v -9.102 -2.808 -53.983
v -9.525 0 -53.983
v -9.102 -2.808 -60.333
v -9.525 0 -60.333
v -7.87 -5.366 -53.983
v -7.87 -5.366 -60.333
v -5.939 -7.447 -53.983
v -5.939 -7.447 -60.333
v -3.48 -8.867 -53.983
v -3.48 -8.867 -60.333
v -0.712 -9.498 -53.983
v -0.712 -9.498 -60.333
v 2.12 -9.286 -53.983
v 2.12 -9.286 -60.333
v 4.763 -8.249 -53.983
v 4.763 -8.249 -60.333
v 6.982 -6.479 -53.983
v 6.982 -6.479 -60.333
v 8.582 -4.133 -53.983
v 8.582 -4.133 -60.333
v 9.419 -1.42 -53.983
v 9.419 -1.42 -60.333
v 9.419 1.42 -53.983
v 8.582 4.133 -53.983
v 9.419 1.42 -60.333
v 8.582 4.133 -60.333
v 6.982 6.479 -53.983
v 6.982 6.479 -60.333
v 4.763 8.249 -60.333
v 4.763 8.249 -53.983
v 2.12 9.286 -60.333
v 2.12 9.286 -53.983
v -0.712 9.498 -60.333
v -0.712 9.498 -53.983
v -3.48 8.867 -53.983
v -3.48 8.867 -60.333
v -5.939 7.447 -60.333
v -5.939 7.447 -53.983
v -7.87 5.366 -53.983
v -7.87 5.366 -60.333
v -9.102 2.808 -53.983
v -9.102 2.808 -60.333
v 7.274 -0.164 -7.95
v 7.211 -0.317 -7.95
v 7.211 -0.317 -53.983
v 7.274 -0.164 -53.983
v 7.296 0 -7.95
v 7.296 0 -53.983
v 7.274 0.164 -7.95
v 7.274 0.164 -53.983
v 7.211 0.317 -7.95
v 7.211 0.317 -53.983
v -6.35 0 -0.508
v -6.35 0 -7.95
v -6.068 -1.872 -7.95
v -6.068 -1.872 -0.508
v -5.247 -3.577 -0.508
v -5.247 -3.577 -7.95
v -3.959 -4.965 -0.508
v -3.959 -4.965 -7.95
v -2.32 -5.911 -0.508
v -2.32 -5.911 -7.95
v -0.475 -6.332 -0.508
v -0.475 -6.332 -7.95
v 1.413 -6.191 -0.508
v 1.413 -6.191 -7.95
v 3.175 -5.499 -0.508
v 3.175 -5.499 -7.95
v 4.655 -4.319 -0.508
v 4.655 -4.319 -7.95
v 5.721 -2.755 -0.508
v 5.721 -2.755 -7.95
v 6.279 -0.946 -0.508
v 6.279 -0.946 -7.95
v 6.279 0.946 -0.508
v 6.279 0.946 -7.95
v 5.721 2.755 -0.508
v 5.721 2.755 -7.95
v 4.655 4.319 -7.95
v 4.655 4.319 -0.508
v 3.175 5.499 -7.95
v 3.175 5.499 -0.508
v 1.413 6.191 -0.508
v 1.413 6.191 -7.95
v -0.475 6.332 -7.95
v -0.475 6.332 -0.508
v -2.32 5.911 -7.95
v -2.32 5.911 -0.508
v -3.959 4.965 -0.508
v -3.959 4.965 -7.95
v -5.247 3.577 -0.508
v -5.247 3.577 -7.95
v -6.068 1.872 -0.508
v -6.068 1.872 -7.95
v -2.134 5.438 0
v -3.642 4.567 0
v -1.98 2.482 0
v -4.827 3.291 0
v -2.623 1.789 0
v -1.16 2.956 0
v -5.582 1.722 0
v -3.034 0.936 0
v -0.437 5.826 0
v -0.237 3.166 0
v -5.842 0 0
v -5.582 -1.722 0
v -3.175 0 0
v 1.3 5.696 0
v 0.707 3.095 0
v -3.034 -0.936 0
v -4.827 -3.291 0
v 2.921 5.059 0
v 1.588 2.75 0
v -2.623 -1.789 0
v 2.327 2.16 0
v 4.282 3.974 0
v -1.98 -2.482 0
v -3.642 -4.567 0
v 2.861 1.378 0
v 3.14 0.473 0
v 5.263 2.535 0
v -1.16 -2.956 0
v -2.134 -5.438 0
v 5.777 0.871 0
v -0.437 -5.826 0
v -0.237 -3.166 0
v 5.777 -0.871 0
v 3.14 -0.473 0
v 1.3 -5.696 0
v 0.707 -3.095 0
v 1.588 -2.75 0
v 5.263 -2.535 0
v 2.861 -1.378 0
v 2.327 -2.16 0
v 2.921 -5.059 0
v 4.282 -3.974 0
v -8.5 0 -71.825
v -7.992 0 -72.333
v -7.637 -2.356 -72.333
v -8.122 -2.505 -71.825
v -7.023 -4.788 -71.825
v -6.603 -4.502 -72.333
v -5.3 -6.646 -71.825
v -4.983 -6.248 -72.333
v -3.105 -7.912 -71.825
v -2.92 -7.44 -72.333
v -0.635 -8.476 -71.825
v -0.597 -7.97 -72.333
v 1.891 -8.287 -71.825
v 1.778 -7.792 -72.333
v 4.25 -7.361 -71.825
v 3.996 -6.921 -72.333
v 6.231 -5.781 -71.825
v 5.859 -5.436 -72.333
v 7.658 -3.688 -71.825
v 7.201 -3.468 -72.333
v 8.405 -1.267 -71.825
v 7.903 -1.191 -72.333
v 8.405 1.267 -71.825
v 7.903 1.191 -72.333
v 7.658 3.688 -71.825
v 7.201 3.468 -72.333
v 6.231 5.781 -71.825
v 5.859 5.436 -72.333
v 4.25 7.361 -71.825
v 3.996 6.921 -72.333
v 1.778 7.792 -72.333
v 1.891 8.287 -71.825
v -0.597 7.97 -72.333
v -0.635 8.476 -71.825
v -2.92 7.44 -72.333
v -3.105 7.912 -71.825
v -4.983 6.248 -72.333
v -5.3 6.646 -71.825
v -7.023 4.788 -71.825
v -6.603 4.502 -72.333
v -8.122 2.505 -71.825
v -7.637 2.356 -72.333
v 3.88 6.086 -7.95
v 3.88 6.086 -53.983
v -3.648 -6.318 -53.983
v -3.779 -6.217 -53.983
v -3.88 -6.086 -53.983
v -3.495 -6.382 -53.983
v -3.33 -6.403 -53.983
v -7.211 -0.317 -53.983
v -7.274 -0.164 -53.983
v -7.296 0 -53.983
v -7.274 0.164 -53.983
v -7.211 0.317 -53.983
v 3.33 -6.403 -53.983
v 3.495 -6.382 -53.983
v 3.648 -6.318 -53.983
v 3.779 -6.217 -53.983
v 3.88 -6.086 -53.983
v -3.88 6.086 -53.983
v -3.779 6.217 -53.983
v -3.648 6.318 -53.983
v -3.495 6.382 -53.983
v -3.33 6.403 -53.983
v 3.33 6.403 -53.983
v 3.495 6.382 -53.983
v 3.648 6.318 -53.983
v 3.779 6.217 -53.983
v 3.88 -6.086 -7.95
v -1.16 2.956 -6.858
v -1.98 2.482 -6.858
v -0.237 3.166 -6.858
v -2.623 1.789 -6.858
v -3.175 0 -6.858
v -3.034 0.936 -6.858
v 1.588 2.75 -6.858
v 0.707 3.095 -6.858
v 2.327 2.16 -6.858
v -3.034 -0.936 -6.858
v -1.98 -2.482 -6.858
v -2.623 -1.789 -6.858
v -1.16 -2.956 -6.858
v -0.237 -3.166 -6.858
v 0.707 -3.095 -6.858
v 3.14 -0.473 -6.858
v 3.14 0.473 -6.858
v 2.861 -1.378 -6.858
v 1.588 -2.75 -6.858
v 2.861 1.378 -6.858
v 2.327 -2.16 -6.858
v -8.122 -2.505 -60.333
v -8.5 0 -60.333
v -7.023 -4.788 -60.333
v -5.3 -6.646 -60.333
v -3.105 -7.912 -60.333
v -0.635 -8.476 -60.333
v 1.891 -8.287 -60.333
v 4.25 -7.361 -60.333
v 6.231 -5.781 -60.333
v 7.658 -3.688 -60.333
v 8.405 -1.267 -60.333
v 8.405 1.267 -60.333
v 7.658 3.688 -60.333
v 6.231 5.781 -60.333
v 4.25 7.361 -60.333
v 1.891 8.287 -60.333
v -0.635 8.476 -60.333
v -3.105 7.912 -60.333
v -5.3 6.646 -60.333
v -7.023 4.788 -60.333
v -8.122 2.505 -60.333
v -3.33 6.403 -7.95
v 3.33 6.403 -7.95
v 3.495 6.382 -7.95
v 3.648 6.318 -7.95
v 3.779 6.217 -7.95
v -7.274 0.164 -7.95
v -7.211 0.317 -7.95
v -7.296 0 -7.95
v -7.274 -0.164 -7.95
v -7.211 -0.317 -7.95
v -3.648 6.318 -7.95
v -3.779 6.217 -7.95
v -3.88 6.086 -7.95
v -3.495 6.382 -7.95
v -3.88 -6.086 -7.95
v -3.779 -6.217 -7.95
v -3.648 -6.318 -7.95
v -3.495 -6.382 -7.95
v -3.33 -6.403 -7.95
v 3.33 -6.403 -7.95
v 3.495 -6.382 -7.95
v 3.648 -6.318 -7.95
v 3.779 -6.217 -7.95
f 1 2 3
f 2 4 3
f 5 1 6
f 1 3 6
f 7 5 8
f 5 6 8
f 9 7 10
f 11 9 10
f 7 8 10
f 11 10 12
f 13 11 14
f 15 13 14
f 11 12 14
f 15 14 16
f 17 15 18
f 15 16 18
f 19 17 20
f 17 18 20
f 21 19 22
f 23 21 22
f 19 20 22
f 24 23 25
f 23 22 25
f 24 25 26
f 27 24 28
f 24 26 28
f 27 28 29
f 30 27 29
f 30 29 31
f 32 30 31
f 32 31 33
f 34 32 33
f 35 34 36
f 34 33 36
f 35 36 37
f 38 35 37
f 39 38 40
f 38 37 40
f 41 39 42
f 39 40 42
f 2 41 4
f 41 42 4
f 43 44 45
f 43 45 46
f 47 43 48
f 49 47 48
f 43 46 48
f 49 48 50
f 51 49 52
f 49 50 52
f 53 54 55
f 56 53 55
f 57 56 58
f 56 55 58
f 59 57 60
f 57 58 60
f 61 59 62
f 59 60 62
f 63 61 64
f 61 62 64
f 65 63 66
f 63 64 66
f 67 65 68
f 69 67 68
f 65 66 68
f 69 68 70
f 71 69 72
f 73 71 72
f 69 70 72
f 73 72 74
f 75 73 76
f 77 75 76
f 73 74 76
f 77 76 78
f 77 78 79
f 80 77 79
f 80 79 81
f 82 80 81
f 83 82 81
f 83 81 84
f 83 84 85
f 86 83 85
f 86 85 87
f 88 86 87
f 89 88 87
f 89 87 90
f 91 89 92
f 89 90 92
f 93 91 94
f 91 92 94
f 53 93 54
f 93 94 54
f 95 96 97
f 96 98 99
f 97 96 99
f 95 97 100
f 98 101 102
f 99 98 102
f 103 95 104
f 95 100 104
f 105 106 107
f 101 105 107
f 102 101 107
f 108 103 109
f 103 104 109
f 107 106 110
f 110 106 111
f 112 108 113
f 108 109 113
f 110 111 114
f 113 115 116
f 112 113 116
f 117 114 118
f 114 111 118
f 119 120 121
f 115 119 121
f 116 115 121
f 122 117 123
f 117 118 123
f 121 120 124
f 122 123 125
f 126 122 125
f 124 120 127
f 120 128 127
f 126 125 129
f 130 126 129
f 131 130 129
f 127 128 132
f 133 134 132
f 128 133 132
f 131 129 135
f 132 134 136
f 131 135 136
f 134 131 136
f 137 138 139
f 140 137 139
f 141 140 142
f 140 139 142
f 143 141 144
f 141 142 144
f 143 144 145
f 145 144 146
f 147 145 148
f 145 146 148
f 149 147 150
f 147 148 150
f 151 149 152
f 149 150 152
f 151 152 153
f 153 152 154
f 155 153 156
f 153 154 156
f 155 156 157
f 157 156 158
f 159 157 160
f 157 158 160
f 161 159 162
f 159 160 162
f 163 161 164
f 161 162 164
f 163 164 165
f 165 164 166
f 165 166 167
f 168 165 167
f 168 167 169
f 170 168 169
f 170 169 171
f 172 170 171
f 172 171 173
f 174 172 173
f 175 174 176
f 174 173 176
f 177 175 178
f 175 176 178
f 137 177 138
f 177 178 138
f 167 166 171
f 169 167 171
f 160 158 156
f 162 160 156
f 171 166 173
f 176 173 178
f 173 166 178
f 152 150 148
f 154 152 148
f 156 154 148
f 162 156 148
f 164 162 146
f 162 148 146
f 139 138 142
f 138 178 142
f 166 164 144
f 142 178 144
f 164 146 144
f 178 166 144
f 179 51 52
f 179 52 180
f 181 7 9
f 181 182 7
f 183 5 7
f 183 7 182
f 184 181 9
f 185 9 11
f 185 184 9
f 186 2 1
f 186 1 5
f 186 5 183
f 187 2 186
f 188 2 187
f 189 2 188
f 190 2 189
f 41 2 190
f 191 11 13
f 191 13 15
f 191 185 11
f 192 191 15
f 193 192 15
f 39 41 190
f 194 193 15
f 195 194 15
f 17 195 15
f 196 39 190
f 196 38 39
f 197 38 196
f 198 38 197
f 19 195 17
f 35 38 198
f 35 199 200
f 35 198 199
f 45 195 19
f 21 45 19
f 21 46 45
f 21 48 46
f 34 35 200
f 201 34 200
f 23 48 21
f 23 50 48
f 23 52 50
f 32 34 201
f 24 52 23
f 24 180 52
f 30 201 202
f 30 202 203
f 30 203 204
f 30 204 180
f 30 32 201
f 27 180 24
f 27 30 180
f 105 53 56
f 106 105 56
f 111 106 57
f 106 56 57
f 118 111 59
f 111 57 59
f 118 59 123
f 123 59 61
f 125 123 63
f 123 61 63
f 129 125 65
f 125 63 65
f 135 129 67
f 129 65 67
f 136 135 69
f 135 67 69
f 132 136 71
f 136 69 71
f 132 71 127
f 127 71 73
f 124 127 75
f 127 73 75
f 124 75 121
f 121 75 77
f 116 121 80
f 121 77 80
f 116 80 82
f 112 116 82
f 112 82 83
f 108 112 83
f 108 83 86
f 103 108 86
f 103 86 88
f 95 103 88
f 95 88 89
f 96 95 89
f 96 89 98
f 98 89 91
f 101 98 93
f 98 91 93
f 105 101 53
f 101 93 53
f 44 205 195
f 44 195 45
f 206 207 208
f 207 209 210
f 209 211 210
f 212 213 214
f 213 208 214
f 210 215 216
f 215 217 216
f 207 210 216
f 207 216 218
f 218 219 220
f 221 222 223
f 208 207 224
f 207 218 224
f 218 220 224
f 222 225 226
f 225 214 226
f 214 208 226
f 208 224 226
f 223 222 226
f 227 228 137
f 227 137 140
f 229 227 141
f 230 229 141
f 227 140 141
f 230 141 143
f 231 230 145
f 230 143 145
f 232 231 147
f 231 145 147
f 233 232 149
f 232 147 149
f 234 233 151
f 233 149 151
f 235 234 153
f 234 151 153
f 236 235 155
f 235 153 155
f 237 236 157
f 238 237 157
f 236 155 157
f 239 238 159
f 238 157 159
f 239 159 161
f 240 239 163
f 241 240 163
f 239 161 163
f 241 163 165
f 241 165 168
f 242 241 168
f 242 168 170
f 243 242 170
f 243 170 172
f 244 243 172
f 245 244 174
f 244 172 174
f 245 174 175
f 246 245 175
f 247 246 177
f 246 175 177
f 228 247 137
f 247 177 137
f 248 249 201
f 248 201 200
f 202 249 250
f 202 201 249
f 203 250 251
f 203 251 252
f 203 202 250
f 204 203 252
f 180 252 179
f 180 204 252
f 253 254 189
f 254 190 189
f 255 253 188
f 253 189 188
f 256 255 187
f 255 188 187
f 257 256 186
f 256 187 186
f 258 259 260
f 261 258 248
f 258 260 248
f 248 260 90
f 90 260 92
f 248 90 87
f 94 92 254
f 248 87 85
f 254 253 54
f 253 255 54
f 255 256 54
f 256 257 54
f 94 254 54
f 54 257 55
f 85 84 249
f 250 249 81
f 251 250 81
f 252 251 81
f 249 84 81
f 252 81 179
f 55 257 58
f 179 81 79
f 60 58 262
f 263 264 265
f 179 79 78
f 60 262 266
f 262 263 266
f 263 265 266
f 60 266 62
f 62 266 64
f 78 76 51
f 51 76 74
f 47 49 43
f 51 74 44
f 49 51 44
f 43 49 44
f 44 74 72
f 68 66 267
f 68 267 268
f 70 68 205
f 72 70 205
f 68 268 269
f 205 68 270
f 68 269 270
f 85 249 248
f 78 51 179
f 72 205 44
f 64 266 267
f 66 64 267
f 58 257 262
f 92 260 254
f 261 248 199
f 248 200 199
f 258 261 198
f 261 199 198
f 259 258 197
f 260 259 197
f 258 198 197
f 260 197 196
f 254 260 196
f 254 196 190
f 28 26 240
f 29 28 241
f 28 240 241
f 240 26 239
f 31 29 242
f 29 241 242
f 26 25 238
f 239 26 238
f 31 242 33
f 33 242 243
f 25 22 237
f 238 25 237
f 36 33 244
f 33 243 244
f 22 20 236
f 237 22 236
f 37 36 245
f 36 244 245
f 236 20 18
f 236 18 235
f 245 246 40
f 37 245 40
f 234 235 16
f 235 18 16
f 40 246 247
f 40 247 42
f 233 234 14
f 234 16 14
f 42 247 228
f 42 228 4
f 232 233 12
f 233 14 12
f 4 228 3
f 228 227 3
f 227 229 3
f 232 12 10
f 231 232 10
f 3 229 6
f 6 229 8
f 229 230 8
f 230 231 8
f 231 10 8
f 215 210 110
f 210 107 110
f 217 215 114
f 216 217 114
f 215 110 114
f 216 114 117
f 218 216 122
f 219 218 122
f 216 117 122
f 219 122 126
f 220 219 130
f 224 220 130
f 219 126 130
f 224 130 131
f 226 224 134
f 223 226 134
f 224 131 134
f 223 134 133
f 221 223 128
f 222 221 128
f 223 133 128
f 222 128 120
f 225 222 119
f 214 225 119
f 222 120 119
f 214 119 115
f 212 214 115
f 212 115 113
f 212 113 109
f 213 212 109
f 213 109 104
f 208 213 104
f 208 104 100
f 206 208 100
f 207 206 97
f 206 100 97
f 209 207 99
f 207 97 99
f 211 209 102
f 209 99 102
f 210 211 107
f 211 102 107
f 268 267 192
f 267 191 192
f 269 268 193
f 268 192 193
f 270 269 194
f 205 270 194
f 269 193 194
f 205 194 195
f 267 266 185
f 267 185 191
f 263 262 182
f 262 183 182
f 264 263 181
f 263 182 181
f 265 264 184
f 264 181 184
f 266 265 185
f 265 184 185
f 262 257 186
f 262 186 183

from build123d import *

# Parameters (mm, degrees)
SKETCH3_OUTSIDE_W  = 36.488
SKETCH3_OUTSIDE_H  = 36.488
CUT_EXTRUDE1_DEPTH = 46.03250001
CHAMFER1_SIZE      = 0.508
FILLET1_R          = 0.635


with BuildPart() as part:
    # Sketch2 → Revolve1 (revolve)
    with BuildSketch(Plane(origin=(0, 0, 0), x_dir=(0, 0, -1), z_dir=(1, 0, 0)), mode=Mode.PRIVATE) as revolve1_sk:
        Polygon((0, 3.175), (0, 6.35), (7.9502, 6.35), (7.9502, 7.62), (53.98270001, 7.62), (53.98270001, 9.525), (60.33270001, 9.525), (60.33270001, 8.5), (72.33270001, 8.5), (72.33270001, 0), (6.858, 0), (6.858, 3.175), align=None)
    revolve(revolve1_sk.sketch.rotate(Axis((0, 0, 0), (0, 0, 1)), 90), axis=Axis((0, 0, 0), (0, 0, 1)))

    # Sketch3 outside → Cut-Extrude1 (cut)
    with BuildSketch(Plane.XY.offset(-7.9502)):
        Rectangle(SKETCH3_OUTSIDE_W, SKETCH3_OUTSIDE_H)
        Polygon((3.696970073, 6.40334), (-3.696970073, 6.40334), (-7.393940145, 0), (-3.696970073, -6.40334), (3.696970073, -6.40334), (7.393940145, 0), align=None, mode=Mode.SUBTRACT)
    extrude(amount=-CUT_EXTRUDE1_DEPTH, mode=Mode.SUBTRACT)

    # Chamfer1
    chamfer1_edges = [part.edges().sort_by_distance(p)[0] for p in [
        (8.5, 0, -72.33270001),
        (6.35, 0, 0),
    ]]
    chamfer(chamfer1_edges, length=CHAMFER1_SIZE)

    # Fillet1
    fillet1_edges = [part.edges().sort_by_distance(p)[0] for p in [
        (3.696970073, 6.40334, -30.966450005),
        (-3.696970073, 6.40334, -30.966450005),
        (-7.393940145, 0, -30.966450005),
        (-3.696970073, -6.40334, -30.966450005),
        (3.696970073, -6.40334, -30.966450005),
        (7.393940145, 0, -30.966450005),
    ]]
    fillet(fillet1_edges, radius=FILLET1_R)


solid = part.part
